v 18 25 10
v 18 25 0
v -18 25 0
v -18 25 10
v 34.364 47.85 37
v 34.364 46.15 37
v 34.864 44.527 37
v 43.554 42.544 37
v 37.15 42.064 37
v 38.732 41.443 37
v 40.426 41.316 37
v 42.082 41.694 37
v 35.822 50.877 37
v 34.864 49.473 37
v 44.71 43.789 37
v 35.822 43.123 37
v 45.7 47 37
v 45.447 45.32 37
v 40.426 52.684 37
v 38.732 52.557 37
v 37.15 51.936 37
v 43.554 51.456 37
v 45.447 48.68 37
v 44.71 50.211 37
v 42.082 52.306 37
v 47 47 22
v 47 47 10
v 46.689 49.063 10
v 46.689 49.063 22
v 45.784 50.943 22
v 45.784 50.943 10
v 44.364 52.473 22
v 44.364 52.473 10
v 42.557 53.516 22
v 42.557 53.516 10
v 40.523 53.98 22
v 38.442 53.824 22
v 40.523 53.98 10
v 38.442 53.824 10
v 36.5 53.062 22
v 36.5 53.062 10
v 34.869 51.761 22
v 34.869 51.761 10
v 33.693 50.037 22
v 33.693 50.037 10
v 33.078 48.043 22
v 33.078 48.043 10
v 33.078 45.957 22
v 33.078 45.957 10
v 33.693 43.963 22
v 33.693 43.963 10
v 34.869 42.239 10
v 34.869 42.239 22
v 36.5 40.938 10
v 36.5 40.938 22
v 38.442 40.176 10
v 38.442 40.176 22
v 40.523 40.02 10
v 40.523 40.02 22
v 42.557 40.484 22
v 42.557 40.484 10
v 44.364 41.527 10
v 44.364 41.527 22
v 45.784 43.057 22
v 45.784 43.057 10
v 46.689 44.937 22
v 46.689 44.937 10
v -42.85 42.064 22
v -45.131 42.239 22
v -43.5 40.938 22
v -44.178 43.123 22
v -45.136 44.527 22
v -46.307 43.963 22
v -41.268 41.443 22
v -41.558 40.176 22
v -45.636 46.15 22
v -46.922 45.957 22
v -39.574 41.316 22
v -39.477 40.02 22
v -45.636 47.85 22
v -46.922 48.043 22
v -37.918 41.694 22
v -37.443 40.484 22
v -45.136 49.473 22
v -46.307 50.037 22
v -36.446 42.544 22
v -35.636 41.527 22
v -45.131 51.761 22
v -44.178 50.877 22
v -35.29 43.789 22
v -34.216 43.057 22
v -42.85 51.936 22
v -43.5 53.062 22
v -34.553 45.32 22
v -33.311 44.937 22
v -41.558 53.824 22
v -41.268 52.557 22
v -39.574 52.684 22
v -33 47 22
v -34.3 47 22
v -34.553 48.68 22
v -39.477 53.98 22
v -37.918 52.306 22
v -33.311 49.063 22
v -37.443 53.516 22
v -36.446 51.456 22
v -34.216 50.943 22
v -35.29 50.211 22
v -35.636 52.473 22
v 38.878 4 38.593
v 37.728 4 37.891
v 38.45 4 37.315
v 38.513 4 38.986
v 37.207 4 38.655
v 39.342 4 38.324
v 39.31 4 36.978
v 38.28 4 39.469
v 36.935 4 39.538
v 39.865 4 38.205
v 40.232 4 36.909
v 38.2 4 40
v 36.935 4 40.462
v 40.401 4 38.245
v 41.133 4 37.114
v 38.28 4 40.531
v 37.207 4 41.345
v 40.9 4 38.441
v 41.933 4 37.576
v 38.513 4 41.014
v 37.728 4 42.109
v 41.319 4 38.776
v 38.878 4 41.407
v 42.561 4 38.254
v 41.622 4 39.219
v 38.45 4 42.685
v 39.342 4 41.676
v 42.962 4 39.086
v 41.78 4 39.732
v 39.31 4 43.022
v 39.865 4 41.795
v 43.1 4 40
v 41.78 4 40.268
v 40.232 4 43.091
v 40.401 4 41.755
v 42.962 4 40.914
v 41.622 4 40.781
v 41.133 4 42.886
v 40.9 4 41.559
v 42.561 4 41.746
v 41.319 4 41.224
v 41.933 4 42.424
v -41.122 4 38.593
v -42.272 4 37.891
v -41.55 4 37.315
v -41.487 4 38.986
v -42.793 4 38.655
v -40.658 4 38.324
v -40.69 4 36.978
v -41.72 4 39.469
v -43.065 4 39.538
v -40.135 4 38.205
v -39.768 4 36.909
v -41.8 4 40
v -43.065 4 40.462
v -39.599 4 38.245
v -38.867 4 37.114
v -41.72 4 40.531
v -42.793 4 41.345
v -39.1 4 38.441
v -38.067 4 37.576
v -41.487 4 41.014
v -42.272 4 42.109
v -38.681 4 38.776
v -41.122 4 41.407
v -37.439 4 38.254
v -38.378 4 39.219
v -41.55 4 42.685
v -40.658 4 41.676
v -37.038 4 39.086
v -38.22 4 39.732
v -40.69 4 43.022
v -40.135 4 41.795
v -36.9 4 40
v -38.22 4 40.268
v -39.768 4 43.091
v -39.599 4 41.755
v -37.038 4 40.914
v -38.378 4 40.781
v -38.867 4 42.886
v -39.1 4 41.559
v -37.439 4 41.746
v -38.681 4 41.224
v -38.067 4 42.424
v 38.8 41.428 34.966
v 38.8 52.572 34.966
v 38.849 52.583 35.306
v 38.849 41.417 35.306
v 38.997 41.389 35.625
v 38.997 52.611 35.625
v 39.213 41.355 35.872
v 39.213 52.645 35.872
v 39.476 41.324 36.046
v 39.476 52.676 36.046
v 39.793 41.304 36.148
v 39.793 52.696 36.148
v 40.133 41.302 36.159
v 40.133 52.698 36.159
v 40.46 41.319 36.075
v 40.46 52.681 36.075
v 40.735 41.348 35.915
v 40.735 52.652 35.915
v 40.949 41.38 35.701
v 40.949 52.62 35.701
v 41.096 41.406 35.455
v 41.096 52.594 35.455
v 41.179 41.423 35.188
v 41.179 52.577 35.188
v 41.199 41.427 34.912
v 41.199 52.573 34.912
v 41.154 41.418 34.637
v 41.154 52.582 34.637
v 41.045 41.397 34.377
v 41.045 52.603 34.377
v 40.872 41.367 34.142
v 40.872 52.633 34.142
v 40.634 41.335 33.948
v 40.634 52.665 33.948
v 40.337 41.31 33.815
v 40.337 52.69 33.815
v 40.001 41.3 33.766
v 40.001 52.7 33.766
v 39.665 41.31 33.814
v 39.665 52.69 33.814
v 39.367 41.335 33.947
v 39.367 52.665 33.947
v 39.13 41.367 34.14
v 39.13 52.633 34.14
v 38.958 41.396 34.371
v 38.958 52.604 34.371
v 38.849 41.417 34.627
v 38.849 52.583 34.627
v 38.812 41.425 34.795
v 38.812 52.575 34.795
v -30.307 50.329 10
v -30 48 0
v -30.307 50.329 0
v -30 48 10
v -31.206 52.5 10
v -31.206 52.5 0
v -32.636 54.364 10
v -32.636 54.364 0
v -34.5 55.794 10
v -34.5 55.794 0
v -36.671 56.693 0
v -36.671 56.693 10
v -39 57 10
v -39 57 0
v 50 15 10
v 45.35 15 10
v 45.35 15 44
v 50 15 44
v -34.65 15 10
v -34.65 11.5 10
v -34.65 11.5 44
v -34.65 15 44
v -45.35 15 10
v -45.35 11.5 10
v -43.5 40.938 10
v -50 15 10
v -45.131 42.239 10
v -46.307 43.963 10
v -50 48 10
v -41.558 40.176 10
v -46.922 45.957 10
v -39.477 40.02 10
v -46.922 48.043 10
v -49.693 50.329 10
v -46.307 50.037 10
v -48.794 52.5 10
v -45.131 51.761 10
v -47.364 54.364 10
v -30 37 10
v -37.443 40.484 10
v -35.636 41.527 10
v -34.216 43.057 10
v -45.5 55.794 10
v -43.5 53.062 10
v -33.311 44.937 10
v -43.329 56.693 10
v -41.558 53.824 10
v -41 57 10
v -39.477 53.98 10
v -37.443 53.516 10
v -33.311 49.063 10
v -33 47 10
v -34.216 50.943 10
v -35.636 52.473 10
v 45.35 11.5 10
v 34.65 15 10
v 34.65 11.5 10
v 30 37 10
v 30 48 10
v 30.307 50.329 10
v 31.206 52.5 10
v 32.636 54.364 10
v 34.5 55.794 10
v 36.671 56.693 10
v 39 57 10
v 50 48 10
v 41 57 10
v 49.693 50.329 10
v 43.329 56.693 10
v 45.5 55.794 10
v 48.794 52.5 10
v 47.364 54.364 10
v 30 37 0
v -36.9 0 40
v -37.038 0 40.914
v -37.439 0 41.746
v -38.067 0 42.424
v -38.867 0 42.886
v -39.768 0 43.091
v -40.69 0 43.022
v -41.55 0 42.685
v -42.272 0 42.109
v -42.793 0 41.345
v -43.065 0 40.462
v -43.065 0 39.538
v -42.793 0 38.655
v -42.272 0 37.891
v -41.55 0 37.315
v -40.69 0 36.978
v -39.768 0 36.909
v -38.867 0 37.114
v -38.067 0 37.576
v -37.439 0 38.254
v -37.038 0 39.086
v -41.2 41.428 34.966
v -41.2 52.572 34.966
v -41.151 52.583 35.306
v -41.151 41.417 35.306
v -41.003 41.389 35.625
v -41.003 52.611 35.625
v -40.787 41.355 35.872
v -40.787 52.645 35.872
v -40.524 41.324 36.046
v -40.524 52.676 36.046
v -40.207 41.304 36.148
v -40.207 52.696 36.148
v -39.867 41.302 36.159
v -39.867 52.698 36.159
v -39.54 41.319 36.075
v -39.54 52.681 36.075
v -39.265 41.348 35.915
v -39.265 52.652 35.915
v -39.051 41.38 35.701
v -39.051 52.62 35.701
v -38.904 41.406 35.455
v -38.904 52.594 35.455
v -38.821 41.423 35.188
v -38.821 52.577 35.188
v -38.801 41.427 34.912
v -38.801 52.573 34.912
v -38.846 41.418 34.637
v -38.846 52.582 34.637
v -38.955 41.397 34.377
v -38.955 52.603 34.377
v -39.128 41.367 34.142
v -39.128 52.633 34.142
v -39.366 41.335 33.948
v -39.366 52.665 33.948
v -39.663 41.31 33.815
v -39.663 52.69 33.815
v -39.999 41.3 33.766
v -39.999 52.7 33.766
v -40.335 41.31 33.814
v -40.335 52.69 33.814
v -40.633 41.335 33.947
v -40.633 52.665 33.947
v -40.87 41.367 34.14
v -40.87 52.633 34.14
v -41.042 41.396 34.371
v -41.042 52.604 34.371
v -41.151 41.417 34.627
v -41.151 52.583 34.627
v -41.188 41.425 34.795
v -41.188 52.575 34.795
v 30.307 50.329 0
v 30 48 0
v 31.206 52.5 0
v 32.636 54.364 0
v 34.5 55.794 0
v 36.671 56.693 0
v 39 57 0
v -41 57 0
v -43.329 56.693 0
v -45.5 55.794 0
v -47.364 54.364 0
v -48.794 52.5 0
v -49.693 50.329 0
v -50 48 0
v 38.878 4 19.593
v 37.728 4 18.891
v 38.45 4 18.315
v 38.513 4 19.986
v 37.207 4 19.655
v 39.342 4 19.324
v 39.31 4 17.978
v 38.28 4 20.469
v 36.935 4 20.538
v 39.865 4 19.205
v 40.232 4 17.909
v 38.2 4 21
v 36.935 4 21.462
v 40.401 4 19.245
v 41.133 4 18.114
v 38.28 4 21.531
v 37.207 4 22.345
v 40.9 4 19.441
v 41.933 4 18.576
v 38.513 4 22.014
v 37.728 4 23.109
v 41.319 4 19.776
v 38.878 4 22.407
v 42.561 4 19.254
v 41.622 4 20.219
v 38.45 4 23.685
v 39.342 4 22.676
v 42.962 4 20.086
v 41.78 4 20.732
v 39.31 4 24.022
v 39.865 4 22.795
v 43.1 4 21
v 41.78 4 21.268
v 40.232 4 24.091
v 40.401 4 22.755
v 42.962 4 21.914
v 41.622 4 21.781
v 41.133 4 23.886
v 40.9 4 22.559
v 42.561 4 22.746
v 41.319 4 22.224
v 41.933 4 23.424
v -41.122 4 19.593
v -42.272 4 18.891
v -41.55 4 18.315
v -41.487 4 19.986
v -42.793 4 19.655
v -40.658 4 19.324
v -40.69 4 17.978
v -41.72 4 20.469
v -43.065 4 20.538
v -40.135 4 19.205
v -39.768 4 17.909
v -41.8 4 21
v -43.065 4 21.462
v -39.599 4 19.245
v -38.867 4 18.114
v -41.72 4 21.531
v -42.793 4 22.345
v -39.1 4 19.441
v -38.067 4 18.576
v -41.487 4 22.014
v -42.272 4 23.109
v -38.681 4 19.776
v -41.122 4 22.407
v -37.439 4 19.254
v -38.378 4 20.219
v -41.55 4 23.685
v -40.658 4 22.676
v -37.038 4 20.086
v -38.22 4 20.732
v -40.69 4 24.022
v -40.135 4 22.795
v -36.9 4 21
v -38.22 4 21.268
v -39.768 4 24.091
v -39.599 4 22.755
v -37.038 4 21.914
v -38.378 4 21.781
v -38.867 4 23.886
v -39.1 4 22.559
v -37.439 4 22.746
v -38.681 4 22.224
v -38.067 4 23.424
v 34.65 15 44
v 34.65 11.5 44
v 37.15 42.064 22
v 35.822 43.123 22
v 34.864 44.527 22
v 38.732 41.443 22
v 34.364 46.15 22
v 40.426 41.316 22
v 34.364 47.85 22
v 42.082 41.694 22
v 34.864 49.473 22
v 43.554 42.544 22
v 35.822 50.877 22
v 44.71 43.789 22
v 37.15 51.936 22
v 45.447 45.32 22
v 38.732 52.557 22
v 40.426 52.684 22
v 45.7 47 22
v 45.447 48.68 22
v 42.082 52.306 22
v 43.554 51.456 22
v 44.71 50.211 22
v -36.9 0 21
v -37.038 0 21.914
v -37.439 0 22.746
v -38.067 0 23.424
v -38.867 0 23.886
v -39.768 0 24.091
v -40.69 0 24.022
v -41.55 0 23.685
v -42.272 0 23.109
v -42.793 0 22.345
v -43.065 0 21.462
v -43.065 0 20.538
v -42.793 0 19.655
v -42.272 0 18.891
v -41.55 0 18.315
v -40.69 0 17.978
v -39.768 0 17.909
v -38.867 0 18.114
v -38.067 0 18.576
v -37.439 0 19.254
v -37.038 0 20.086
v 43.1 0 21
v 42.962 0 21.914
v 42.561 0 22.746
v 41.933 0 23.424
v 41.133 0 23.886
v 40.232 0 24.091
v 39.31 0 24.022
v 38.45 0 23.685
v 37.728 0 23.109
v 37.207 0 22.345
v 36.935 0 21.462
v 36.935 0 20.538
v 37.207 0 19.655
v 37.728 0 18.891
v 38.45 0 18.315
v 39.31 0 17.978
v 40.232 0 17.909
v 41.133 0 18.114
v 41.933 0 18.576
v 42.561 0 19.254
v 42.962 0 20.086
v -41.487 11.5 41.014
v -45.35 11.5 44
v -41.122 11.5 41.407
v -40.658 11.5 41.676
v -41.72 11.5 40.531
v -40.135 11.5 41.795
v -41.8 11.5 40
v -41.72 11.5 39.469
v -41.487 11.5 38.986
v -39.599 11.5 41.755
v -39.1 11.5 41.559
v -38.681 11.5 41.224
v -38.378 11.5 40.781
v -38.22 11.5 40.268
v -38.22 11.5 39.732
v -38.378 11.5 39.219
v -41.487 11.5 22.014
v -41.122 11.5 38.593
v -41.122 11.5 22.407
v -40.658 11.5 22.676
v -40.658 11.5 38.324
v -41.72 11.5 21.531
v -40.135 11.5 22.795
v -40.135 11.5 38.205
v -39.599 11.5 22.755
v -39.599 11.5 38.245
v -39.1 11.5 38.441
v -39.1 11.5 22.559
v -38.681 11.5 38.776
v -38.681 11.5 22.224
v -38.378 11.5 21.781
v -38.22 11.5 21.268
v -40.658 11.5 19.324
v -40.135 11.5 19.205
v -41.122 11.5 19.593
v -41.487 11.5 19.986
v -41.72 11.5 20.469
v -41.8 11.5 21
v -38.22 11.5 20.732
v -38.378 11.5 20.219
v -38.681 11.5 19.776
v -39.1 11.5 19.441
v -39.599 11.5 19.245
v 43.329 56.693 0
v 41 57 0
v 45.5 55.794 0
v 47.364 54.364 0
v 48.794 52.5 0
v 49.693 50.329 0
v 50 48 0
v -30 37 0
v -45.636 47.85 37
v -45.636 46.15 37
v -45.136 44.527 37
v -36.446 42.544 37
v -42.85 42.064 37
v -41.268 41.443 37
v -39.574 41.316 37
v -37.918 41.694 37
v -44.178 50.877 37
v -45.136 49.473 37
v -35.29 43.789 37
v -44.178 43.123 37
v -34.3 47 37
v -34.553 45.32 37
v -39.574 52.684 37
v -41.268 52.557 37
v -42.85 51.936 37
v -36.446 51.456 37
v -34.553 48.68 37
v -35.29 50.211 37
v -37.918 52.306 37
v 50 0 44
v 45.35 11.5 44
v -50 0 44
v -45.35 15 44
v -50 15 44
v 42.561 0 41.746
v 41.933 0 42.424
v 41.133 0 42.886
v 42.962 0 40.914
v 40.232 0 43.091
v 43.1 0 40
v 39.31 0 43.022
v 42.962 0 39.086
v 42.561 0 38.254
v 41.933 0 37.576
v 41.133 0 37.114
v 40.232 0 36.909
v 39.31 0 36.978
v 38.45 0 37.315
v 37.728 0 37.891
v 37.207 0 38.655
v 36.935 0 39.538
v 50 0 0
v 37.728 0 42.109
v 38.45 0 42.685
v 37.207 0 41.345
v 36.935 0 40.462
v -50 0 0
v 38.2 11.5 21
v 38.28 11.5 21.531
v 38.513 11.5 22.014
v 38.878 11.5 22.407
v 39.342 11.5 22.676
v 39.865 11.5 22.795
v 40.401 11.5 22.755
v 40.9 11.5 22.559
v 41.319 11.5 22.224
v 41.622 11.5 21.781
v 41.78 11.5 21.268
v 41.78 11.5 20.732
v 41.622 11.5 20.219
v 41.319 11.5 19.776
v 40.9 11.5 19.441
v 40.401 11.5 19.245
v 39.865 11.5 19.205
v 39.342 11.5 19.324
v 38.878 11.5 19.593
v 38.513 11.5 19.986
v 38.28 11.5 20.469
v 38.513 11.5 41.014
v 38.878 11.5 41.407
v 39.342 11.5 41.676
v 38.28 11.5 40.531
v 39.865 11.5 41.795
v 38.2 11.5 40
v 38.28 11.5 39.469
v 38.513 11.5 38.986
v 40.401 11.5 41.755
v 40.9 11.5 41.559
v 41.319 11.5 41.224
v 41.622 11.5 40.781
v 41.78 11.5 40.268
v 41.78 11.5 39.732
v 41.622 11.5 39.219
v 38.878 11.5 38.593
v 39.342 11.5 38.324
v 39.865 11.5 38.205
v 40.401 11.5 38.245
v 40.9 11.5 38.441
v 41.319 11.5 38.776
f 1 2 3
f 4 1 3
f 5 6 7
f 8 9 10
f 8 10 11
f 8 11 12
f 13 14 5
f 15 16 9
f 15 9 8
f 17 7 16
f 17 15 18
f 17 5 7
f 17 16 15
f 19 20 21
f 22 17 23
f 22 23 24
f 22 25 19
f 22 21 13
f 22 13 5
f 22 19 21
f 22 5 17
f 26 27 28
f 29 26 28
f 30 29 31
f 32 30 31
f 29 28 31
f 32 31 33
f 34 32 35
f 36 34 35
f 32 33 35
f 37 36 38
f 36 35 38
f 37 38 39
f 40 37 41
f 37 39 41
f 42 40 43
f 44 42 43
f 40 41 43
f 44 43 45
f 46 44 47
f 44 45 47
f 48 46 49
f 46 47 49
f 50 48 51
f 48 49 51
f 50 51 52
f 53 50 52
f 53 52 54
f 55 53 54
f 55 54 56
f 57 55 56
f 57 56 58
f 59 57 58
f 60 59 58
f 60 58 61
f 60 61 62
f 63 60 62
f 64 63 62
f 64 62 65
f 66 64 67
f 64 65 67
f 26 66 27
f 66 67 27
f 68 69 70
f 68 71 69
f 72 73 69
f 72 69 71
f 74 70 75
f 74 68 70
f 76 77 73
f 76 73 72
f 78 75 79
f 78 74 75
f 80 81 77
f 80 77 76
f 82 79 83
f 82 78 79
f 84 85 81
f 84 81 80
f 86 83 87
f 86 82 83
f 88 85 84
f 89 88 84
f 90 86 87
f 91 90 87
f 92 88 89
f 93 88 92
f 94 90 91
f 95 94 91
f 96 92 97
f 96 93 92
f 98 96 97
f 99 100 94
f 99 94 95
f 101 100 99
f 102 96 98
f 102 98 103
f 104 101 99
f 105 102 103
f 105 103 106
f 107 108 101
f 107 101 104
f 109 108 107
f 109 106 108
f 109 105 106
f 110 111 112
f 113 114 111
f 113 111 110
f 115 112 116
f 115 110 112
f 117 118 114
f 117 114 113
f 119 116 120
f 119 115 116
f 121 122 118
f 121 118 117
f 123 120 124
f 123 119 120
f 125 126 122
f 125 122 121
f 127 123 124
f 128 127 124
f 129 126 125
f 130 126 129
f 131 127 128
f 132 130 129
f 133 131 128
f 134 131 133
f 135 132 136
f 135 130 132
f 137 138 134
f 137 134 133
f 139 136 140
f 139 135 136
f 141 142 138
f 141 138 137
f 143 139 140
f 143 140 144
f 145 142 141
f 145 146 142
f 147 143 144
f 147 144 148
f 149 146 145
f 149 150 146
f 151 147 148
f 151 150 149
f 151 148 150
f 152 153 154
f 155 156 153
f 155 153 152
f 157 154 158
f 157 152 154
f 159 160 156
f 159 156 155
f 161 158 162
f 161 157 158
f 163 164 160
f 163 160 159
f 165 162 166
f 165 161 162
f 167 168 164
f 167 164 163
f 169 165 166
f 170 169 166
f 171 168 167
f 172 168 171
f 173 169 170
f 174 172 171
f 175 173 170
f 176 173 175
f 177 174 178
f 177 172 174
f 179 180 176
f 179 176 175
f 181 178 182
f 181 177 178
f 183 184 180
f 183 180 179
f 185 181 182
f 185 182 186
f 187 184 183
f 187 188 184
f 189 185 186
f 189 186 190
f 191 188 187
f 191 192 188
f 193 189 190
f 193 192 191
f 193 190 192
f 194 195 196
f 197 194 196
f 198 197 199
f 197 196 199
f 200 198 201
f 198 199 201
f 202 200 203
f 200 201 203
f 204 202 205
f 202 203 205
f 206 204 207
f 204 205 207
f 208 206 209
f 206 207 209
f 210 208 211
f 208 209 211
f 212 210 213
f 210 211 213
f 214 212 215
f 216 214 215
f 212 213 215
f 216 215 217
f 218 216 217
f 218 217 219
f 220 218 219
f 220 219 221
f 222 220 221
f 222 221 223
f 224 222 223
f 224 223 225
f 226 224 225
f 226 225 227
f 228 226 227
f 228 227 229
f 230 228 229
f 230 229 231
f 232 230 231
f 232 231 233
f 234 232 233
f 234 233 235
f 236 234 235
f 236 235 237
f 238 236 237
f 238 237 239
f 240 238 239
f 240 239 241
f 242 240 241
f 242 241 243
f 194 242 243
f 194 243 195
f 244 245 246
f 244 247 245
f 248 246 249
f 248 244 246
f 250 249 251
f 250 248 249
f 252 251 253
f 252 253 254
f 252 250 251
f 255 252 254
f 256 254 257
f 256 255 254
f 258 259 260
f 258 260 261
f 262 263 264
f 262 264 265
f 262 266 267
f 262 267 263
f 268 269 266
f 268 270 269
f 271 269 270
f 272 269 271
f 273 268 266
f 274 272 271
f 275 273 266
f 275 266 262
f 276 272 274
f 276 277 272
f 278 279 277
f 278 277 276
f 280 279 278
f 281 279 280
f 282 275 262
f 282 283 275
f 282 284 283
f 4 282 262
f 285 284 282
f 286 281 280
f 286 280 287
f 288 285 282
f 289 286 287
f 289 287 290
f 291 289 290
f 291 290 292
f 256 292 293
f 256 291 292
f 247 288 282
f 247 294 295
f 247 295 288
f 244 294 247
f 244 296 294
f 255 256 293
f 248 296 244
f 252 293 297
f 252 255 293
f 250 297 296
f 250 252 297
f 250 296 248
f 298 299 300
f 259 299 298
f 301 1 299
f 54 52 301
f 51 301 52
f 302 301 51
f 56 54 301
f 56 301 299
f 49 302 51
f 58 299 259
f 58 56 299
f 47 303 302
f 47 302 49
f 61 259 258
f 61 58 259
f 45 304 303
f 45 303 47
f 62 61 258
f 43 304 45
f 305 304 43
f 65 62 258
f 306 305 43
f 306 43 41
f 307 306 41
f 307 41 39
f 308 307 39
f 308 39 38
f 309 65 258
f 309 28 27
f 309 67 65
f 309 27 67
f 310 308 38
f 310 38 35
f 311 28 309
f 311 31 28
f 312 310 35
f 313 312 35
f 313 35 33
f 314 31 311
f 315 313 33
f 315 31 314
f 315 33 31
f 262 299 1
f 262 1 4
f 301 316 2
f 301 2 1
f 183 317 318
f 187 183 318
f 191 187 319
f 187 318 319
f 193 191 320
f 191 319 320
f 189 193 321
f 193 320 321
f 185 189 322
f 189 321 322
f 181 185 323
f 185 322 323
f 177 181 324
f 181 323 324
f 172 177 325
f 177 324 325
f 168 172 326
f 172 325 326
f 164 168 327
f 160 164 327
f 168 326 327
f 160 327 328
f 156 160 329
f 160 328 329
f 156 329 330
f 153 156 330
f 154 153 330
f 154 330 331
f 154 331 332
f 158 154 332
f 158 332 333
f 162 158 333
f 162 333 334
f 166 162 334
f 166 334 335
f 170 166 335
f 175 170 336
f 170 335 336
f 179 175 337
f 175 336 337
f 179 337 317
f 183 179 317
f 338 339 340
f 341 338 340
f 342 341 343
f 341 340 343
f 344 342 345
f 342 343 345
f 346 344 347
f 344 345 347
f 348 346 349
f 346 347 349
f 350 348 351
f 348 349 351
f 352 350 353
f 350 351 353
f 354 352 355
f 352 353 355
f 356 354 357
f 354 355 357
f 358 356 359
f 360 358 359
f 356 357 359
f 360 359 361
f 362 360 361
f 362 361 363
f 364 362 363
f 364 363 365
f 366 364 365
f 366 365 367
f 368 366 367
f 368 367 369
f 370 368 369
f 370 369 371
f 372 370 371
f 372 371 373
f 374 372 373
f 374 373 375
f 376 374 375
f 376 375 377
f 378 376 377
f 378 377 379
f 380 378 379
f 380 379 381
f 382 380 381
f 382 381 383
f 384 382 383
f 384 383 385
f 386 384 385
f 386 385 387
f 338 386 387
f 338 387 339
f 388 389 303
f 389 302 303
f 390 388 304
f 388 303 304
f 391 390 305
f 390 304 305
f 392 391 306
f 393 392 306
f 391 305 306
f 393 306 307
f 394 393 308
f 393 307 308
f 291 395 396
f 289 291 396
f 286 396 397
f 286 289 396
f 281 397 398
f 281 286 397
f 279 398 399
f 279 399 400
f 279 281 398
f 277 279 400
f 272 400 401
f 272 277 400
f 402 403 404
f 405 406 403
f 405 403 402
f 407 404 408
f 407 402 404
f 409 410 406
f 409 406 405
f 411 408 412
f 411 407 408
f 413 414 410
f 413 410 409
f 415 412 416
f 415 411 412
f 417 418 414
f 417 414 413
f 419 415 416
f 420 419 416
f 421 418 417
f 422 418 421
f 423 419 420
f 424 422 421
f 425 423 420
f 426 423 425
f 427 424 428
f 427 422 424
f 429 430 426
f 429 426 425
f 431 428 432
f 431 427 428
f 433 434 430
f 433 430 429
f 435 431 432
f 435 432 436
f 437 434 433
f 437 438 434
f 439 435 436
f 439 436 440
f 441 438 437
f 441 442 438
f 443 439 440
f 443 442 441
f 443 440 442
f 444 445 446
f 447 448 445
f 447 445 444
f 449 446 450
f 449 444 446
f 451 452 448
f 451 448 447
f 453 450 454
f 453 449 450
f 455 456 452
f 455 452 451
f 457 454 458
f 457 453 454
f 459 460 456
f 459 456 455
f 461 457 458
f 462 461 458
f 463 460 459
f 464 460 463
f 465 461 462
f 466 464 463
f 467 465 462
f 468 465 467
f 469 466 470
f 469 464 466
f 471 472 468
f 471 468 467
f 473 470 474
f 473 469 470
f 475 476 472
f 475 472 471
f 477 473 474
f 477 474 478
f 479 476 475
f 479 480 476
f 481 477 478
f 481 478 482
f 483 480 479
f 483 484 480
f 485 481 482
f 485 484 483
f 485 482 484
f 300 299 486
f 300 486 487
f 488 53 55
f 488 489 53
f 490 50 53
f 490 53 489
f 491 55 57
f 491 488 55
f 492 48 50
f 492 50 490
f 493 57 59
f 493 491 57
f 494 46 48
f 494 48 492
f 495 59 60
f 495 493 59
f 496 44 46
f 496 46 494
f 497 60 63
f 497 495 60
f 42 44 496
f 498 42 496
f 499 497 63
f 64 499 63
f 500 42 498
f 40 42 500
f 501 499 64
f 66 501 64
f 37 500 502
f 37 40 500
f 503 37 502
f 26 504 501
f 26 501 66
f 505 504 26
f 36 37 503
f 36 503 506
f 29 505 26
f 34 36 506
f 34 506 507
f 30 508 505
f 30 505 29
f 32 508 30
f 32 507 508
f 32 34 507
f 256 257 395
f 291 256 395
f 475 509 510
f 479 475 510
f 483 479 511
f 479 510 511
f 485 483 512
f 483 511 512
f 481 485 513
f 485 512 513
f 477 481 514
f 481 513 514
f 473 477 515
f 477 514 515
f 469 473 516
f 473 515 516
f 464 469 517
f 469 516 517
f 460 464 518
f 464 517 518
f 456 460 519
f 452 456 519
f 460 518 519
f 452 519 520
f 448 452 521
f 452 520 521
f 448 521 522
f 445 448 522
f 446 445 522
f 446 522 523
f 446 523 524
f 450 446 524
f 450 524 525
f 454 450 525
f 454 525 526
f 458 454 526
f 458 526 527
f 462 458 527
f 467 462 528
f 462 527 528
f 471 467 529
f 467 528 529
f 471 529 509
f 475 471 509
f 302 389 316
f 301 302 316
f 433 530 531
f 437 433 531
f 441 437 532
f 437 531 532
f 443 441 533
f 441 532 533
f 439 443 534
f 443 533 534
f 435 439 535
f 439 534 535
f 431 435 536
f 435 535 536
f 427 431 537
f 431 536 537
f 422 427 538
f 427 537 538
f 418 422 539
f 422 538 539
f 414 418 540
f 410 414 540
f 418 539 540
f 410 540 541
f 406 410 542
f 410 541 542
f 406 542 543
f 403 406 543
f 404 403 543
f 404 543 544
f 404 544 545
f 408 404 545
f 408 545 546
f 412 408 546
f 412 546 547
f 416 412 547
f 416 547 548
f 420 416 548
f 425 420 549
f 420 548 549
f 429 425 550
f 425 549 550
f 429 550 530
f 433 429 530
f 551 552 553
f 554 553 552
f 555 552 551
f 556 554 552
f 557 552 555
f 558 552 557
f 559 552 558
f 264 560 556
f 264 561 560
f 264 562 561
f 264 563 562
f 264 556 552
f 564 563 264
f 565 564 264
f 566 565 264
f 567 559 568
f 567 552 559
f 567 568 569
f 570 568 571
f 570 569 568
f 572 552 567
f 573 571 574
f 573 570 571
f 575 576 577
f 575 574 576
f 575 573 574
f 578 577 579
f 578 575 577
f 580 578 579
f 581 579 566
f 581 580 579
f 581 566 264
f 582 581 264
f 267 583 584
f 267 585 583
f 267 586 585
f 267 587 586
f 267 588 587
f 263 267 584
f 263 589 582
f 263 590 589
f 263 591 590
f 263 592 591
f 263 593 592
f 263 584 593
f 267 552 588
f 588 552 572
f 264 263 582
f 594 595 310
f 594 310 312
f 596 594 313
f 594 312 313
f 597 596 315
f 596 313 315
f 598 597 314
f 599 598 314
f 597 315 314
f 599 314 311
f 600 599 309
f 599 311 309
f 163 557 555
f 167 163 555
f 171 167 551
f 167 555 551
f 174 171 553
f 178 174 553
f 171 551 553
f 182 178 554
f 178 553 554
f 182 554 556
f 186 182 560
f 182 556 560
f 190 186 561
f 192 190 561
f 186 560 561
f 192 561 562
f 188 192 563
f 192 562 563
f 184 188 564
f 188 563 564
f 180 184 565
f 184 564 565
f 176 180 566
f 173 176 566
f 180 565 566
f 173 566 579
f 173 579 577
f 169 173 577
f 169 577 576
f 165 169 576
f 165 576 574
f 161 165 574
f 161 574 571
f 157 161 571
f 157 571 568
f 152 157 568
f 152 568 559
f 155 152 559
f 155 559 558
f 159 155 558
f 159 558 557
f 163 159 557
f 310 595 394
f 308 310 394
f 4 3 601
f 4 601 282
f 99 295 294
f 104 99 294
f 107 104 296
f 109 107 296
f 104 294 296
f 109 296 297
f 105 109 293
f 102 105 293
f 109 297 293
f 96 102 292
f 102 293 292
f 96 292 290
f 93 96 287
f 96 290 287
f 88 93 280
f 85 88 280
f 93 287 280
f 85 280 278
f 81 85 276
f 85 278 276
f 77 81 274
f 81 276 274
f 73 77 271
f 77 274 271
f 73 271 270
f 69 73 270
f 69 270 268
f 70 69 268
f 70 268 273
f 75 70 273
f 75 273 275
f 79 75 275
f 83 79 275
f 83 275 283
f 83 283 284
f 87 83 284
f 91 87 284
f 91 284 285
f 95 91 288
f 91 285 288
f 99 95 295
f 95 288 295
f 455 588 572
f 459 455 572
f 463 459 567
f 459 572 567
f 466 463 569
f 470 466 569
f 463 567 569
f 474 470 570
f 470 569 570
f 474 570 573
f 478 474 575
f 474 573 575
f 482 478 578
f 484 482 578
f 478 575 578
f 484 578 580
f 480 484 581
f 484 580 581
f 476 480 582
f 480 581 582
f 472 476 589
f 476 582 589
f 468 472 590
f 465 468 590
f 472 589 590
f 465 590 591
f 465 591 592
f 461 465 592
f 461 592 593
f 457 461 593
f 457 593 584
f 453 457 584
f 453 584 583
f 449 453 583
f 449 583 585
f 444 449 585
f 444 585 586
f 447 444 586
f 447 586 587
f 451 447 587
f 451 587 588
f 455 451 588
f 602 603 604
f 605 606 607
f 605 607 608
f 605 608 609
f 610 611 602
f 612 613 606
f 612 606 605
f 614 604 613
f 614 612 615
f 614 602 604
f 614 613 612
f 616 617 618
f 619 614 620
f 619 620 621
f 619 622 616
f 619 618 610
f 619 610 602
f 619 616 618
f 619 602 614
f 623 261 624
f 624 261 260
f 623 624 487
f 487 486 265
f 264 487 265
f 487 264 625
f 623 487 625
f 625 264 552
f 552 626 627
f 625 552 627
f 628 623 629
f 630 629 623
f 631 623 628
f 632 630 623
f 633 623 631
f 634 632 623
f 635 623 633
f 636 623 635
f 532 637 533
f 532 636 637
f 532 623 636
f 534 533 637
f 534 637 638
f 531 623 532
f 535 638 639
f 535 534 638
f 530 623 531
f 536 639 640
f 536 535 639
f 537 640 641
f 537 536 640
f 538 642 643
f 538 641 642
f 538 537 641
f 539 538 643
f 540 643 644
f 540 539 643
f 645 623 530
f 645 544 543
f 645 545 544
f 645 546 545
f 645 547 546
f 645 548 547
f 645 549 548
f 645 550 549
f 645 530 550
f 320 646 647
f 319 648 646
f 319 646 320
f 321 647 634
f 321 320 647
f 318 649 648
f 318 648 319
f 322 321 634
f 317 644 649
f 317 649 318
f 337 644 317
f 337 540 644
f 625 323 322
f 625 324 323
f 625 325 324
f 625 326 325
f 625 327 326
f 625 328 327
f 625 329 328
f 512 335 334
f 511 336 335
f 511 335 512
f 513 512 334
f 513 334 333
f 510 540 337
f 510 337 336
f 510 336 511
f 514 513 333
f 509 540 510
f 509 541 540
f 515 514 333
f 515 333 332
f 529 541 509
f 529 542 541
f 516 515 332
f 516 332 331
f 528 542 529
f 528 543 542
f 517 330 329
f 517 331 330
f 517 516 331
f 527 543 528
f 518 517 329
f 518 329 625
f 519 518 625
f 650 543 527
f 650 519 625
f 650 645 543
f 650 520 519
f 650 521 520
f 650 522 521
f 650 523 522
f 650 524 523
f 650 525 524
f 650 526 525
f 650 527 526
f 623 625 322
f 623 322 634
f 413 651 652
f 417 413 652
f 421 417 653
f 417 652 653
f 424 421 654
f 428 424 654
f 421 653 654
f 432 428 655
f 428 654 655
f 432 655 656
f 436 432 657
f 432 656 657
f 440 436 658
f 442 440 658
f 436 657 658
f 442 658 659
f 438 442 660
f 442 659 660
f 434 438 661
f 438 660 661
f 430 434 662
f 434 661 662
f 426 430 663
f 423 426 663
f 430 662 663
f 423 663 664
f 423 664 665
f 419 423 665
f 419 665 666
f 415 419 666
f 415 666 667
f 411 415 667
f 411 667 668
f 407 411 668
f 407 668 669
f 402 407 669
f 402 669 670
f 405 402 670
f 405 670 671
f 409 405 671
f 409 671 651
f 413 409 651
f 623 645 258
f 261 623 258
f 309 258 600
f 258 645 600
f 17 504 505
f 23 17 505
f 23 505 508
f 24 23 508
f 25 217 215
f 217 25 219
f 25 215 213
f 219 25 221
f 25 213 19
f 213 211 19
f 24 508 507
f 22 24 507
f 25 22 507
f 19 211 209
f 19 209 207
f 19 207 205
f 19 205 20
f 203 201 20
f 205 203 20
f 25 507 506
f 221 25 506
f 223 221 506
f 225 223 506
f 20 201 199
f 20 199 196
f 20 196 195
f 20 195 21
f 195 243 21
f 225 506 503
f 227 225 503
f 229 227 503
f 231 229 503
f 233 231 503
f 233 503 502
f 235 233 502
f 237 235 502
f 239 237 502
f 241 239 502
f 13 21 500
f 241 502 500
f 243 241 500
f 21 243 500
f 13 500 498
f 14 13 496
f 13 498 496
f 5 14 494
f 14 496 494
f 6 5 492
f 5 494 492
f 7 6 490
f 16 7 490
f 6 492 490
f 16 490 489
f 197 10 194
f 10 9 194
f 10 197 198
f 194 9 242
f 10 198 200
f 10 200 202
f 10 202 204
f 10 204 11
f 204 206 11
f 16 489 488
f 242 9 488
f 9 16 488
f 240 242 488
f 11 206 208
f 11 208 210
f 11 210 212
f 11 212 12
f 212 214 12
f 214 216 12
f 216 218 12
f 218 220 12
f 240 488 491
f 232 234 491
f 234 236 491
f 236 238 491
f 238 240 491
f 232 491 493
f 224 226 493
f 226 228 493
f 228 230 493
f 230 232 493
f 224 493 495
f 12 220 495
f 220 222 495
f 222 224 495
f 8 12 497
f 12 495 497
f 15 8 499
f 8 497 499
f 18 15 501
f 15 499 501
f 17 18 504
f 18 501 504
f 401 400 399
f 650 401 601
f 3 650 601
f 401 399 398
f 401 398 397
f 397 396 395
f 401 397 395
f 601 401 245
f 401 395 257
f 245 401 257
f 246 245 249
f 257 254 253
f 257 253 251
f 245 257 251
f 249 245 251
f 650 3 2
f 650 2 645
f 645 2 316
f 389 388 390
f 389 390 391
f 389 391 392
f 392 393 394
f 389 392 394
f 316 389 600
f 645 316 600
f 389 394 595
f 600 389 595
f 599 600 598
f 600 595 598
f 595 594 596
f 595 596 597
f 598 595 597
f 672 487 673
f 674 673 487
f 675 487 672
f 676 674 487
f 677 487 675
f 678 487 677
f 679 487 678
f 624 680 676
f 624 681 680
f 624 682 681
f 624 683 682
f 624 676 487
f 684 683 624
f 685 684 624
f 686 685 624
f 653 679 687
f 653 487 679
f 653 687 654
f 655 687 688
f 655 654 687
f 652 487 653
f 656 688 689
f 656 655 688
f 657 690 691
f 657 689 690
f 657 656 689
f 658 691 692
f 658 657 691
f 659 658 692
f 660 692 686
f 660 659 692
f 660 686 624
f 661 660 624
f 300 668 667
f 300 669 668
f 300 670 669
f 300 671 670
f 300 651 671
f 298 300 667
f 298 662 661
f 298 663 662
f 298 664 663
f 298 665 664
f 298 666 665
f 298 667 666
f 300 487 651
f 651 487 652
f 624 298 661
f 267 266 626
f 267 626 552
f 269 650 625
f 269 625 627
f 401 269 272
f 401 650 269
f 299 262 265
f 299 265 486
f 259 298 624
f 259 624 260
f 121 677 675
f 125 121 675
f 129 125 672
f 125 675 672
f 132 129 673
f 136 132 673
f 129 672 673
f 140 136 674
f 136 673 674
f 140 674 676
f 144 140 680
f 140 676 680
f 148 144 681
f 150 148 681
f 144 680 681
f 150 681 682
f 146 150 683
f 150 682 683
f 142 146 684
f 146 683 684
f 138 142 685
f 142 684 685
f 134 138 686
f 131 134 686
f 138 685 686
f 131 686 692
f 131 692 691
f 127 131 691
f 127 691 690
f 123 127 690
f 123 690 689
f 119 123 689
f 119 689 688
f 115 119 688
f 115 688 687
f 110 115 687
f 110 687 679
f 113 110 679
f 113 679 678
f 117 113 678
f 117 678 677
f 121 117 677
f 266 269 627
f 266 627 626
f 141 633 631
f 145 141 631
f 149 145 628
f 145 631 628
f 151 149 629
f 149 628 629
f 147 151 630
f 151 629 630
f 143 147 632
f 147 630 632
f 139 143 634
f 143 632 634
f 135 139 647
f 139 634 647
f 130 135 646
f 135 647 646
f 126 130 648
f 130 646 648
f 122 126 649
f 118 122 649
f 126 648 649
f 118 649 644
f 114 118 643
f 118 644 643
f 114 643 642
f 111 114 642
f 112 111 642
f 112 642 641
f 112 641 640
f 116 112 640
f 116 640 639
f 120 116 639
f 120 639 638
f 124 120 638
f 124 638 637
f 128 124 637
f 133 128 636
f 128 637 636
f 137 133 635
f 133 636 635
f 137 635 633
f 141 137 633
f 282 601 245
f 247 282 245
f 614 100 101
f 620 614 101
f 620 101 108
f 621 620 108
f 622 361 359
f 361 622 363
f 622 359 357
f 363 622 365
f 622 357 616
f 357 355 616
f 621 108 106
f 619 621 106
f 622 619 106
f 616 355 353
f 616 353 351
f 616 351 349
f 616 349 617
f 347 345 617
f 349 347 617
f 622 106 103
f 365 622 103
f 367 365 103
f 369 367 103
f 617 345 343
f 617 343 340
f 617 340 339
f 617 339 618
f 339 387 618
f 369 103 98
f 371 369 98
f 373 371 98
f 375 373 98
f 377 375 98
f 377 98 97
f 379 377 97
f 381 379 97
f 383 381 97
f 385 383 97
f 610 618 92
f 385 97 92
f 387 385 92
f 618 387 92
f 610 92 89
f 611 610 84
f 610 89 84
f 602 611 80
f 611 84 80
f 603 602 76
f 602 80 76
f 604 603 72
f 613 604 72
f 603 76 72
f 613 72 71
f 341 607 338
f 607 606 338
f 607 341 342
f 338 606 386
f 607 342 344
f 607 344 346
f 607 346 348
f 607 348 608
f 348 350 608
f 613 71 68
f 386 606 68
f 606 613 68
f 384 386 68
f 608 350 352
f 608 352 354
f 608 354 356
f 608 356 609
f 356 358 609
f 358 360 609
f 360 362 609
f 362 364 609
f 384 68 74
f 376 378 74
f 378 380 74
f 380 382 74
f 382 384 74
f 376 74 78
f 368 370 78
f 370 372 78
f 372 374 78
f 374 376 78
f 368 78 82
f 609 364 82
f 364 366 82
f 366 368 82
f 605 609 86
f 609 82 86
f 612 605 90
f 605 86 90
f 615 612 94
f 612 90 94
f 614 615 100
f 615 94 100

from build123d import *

# Parameters (mm, degrees)
PAD_DEPTH       = 10
SKETCH001_R     = 7
PAD001_DEPTH    = 12
SKETCH002_R     = 5.7
PAD002_DEPTH    = 15
PAD003_DEPTH    = 34
SKETCH004_R     = 1.8
POCKET_DEPTH    = 11.5
SKETCH005_R     = 1.2
POCKET001_DEPTH = 18
SKETCH006_R     = 3.1
POCKET002_DEPTH = 4
CHAMFER_SIZE    = 12
FILLET_R        = 9


with BuildPart() as part:
    # Sketch → Pad (new body)
    with BuildSketch(Plane.XY):
        Polygon((-50, 0), (50, 0), (50, 57), (30, 57), (30, 25), (-30, 25), (-30, 57), (-50, 57), align=None)
    extrude(amount=PAD_DEPTH)

    # Sketch001 (on Face10 of Pad) → Pad001 (join)
    with BuildSketch(Plane.XY.offset(10)):
        with Locations((-40, 47)):
            Circle(SKETCH001_R)
        with Locations((40, 47)):
            Circle(SKETCH001_R)
    extrude(amount=PAD001_DEPTH)

    # Sketch002 (on Face14 of Pad001) → Pad002 (join)
    with BuildSketch(Plane.XY.offset(22)):
        with Locations((-40, 47)):
            Circle(SKETCH002_R)
        with Locations((40, 47)):
            Circle(SKETCH002_R)
    extrude(amount=PAD002_DEPTH)

    # Sketch003 (on Face5 of Pad002) → Pad003 (join)
    with BuildSketch(Plane.XY.offset(10)):
        Polygon((-50, 15), (-45.35, 15), (-45.35, 11.5), (-34.65, 11.5), (-34.65, 15), (34.65, 15), (34.65, 11.5), (45.35, 11.5), (45.35, 15), (50, 15), (50, 0), (-50, 0), align=None)
    extrude(amount=PAD003_DEPTH)

    # Sketch004 (on Face17 of Pad003) → Pocket (cut)
    with BuildSketch(Plane(origin=(0, 11.5, 0), x_dir=(-1, 0, 0), z_dir=(0, 1, 0))):
        with Locations((-40, 40)):
            Circle(SKETCH004_R)
        with Locations((-40, 21)):
            Circle(SKETCH004_R)
        with Locations((40, 40)):
            Circle(SKETCH004_R)
        with Locations((40, 21)):
            Circle(SKETCH004_R)
    extrude(amount=-POCKET_DEPTH, mode=Mode.SUBTRACT)

    # Sketch005 (on Face4 of Pocket) → Pocket001 (cut)
    with BuildSketch(Plane(origin=(0, 57, 0), x_dir=(-1, 0, 0), z_dir=(0, 1, 0))):
        with Locations((-40, 34.96648)):
            Circle(SKETCH005_R)
        with Locations((40, 34.96648)):
            Circle(SKETCH005_R)
    extrude(amount=-POCKET001_DEPTH, mode=Mode.SUBTRACT)

    # Sketch006 (on Face10 of Pocket001) → Pocket002 (cut)
    with BuildSketch(Plane.XZ):
        with Locations((-40, 40)):
            Circle(SKETCH006_R)
        with Locations((40, 40)):
            Circle(SKETCH006_R)
        with Locations((40, 21)):
            Circle(SKETCH006_R)
        with Locations((-40, 21)):
            Circle(SKETCH006_R)
    extrude(amount=-POCKET002_DEPTH, mode=Mode.SUBTRACT)

    # Chamfer
    chamfer_edges = [part.edges().sort_by_distance(p)[0] for p in [
        (-30, 25, 5),
        (30, 25, 5),
    ]]
    chamfer(chamfer_edges, length=CHAMFER_SIZE)

    # Fillet
    fillet_edges = [part.edges().sort_by_distance(p)[0] for p in [
        (-50, 57, 5),
        (-30, 57, 5),
        (30, 57, 5),
        (50, 57, 5),
    ]]
    fillet(fillet_edges, radius=FILLET_R)


solid = part.part
